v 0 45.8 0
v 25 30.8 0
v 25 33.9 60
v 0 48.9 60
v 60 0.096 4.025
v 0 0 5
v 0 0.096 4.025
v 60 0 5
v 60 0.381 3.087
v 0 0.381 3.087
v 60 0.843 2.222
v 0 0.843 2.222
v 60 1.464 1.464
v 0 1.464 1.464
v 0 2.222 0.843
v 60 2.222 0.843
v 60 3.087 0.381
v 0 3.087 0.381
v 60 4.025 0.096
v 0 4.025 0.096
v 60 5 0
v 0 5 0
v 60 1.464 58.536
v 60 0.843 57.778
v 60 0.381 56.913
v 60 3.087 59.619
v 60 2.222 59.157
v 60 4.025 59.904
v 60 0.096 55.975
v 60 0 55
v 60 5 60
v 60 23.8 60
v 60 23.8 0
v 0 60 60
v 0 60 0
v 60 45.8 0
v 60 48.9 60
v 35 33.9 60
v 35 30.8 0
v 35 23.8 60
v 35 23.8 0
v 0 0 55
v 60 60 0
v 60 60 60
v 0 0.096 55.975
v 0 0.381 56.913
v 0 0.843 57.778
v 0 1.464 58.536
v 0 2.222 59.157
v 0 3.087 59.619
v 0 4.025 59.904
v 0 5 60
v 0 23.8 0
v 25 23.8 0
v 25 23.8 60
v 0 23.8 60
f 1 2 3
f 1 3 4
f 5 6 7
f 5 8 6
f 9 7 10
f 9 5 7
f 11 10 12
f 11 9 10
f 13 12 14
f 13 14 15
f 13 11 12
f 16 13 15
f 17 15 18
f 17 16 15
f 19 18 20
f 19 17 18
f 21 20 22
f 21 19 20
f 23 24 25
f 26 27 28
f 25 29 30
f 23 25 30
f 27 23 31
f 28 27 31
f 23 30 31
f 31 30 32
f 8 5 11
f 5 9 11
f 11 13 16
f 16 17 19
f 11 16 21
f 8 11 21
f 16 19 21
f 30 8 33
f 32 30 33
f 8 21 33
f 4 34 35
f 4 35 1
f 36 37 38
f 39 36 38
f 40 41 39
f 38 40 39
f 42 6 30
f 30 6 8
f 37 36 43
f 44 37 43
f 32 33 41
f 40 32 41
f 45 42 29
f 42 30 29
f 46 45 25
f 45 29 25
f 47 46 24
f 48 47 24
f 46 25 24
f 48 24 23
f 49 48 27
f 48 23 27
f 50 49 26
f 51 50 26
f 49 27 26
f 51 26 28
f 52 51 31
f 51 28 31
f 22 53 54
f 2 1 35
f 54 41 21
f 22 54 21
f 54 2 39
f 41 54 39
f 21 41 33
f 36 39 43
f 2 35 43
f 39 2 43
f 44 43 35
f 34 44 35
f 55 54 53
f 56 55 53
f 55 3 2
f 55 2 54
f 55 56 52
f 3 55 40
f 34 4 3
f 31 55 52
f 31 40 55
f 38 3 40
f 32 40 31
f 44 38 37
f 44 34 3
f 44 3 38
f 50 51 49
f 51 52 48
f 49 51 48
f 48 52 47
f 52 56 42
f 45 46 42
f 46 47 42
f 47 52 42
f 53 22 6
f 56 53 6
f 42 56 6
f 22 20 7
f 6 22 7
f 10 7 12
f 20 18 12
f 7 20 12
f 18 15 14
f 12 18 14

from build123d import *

# Parameters (mm, degrees)
BOSS_EXTRU_1_DEPTH      = 60
ENL_V_START             = 1.589213588
ENL_V_MAT_EXTRU_1_DEPTH = 60.853997617
CONG_1_R                = 5


# Read off the part's stored shape, not the designer's step: Enlèv. mat.-Extru.1
with BuildPart() as part:
    # Esquisse1 → Boss.-Extru.1 (new body)
    with BuildSketch(Plane.XY):
        Polygon((0, 0), (60, 0), (60, 23.8), (35, 23.8), (35, 30.8), (60, 45.8), (60, 60), (0, 60), (0, 45.8), (25, 30.8), (25, 23.8), (0, 23.8), align=None)
    extrude(amount=BOSS_EXTRU_1_DEPTH)

    # Enlèv. mat.-Extru.1 outline → Enlèv. mat.-Extru.1 (cut)
    with BuildSketch(Plane(origin=(0, 0, 0), x_dir=(1, 0, 0), z_dir=(0, 0.05159784377706792, 0.9986679440722813)).offset(ENL_V_START)):
        Polygon((60, 45.738991839), (35, 30.758972677), (35, 26), (60, 26), align=None)
        Polygon((0, 26), (25, 26), (25, 30.758972677), (0, 45.738991839), align=None)
    extrude(amount=ENL_V_MAT_EXTRU_1_DEPTH, mode=Mode.SUBTRACT)

    # Congé1
    cong_1_edges = [part.edges().sort_by_distance(p)[0] for p in [
        (30, 0, 0),
        (30, 0, 60),
    ]]
    fillet(cong_1_edges, radius=CONG_1_R)


solid = part.part
